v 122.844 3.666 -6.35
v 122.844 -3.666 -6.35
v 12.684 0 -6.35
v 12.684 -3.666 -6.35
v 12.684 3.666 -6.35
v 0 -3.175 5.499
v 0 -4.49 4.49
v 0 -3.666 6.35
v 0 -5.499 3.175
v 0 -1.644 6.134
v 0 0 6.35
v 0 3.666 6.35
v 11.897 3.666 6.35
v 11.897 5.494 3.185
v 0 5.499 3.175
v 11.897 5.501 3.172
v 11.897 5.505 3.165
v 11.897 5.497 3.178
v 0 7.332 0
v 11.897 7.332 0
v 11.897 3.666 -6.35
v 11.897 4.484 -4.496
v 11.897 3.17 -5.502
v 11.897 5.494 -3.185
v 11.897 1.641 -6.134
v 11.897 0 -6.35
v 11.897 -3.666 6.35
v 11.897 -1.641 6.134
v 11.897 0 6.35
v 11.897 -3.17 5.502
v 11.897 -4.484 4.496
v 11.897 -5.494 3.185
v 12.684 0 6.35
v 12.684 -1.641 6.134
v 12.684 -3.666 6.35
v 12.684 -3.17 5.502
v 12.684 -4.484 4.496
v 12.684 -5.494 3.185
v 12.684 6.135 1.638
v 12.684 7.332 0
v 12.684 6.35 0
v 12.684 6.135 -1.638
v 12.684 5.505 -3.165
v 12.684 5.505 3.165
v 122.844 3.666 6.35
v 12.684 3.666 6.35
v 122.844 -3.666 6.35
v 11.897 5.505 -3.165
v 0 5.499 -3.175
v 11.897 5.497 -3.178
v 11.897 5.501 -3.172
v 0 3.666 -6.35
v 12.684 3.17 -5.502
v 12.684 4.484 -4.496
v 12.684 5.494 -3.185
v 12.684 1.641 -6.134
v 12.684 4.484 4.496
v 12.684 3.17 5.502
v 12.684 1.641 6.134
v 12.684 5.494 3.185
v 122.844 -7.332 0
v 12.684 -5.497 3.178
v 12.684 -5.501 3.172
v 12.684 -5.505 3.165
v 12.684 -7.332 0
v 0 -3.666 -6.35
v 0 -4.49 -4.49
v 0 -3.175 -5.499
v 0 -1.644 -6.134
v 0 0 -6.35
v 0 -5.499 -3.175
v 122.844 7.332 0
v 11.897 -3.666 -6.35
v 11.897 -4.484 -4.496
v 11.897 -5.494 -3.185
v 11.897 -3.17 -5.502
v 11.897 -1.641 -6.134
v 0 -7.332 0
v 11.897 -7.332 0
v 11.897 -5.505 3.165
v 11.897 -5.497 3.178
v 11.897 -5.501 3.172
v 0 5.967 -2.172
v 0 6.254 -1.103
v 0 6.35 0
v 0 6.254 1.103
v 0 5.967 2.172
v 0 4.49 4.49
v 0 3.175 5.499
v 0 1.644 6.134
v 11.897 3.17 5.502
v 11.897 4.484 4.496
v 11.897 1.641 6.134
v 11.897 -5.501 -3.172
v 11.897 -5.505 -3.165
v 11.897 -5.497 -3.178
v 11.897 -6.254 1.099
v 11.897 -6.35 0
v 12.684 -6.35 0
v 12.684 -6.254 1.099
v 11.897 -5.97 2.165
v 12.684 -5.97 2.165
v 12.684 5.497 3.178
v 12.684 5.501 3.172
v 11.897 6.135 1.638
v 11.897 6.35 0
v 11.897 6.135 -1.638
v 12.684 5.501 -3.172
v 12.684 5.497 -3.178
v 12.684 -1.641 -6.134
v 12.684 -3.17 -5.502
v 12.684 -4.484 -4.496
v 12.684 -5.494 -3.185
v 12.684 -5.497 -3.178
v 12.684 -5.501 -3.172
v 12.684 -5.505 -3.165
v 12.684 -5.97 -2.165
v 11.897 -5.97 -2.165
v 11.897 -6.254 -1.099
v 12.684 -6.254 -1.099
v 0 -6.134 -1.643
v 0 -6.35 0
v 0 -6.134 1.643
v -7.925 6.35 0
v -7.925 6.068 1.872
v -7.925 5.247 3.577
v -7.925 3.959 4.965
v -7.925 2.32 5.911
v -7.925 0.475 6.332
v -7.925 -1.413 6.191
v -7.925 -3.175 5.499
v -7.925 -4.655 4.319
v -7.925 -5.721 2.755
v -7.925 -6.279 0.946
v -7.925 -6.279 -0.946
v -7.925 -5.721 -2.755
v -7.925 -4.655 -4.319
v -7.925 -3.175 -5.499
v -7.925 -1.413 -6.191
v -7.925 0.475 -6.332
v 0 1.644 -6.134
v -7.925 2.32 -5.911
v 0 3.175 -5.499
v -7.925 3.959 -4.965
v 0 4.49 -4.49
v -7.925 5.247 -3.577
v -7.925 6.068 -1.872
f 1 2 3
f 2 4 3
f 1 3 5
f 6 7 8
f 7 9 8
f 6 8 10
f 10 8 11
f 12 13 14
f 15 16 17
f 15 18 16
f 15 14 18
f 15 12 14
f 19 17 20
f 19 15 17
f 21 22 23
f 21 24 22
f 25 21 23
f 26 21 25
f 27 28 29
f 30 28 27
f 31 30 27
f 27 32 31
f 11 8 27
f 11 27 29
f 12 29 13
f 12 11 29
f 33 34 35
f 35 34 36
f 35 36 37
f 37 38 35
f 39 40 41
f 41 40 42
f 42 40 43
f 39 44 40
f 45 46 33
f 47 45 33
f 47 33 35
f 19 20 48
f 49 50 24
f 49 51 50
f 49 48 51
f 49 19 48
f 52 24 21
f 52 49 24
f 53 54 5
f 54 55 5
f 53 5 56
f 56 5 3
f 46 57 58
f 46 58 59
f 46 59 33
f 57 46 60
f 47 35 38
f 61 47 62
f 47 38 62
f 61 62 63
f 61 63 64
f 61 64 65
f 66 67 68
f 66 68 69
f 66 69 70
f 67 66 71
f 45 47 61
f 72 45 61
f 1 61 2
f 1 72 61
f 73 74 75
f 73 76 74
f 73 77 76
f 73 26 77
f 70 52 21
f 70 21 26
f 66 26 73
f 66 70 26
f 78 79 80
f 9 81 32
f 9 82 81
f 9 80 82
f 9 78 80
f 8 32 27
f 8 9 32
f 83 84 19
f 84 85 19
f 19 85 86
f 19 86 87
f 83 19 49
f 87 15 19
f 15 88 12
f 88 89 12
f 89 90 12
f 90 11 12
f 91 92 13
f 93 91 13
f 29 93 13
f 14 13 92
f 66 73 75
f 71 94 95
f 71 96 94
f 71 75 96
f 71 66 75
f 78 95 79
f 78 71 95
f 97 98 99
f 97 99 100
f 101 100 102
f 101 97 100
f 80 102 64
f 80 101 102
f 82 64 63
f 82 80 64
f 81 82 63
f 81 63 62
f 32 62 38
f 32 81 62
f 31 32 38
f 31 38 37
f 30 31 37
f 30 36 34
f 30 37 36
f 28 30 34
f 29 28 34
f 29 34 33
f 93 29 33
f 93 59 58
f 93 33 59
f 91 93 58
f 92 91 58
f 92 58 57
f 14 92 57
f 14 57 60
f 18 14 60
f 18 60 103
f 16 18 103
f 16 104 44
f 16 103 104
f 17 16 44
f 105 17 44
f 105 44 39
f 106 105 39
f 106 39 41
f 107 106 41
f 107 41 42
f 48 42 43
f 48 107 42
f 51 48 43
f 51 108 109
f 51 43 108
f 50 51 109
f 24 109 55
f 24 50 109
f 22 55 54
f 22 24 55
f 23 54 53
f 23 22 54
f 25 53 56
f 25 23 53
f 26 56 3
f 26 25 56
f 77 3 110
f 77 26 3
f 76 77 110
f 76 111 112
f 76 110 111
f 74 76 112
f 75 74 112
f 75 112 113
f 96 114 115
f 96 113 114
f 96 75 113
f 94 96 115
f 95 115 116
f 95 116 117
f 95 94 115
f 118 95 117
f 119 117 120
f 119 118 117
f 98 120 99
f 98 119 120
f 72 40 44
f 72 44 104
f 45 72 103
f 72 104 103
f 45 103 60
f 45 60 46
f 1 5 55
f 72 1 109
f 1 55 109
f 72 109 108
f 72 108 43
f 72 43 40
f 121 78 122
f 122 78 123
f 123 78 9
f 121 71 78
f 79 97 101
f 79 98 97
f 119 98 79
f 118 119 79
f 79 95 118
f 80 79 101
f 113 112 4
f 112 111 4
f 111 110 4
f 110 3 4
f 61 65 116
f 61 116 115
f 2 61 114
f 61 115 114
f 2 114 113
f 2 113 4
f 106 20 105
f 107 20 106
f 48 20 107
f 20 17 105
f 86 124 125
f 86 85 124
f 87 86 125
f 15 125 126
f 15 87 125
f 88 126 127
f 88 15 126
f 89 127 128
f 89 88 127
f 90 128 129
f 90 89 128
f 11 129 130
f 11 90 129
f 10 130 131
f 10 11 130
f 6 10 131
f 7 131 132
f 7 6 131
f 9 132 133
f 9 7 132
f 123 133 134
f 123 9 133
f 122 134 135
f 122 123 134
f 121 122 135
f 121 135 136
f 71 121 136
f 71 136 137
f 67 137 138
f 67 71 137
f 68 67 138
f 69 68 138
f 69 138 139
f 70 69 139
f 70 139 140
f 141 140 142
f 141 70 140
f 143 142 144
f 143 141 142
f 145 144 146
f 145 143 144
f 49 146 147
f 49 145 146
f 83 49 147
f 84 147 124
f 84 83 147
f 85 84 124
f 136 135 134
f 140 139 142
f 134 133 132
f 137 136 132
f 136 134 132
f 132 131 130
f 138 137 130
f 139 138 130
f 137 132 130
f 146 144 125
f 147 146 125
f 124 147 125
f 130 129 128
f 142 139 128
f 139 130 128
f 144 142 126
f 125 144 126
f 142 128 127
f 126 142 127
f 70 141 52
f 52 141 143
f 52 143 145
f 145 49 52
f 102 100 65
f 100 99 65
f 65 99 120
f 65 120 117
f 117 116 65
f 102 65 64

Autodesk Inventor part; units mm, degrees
ref_plane "YZ Plane" through (0, 0, 0) normal (1, 0, 0) x (0, 1, 0)
ref_plane "XZ Plane" through (0, 0, 0) normal (0, 1, 0) x (-1, 0, 0)
ref_plane "XY Plane" through (0, 0, 0) normal (0, 0, 1) x (1, 0, 0)
sketch "Sketch1" plane through (0, 0, 0) normal (1, 0, 0) x (0, 1, 0)
  line L0 (7.3323, 0) -> (3.6662, -6.35)
  line L1 (3.6662, -6.35) -> (-3.6662, -6.35)
  line L2 (-3.6662, -6.35) -> (-7.3323, 0)
  line L3 (-7.3323, 0) -> (-3.6662, 6.35)
  line L4 (-3.6662, 6.35) -> (3.6662, 6.35)
  line L5 (3.6662, 6.35) -> (7.3323, 0)
  circle A0 centre (0, 0) radius 6.35
  dimension "d0" = 12.7
extrude "Extrusion1" add sketch "Sketch1" along normal blind 22.844
extrude "Extrusion2" add sketch "Sketch1" against normal blind 7.9248 contours A0
ref_plane "Work Plane1" through (0, 7.3323, 0) normal (0, 0, -1) x (1, 0, 0)
sketch "Sketch2" plane through (0, 7.3323, 0) normal (0, 0, -1) x (1, 0, 0)
  line L0 (0, 13.6823) -> (-7.9248, 13.6823) projected
  line L1 (0, 10.9985) -> (0, 14.6647) projected
  line L2 (0, 14.6647) -> (22.844, 14.6647) projected
  line L3 (11.8966, 14.6647) -> (12.684, 14.6647)
  line L4 (12.684, 14.6647) -> (12.684, 13.6823)
  line L5 (12.684, 13.6823) -> (11.8966, 13.6823)
  line L6 (11.8966, 13.6823) -> (11.8966, 14.6647)
  line L7 (0, 7.3323) -> (22.844, 7.3323)
  line L8 (22.844, 3.6662) -> (22.844, 10.9985) projected
  line L9 (22.844, 14.6647) -> (22.844, 10.9985) projected
  dimension "d7" = 0.7874
  dimension "d9" = 10.16
revolve "Revolution1" cut sketch "Sketch2" angle 360 about axis through (0, 0, 0) along (1, 0, 0)
sketch "Sketch3" plane through (22.844, 0, 0) normal (1, 0, 0) x (0, 0, -1)
  line L0 (6.35, 3.6662) -> (0, 7.3323) projected
  line L1 (0, 7.3323) -> (-6.35, 3.6662) projected
  line L2 (-6.35, 3.6662) -> (-6.35, -3.6662) projected
  line L3 (-6.35, -3.6662) -> (0, -7.3323) projected
  line L4 (0, -7.3323) -> (6.35, -3.6662) projected
  line L5 (6.35, -3.6662) -> (6.35, 3.6662) projected
  point P0 (0, 0)
extrude "Extrusion3" add sketch "Sketch3" along normal blind 100
properties part number "LongShaft"
